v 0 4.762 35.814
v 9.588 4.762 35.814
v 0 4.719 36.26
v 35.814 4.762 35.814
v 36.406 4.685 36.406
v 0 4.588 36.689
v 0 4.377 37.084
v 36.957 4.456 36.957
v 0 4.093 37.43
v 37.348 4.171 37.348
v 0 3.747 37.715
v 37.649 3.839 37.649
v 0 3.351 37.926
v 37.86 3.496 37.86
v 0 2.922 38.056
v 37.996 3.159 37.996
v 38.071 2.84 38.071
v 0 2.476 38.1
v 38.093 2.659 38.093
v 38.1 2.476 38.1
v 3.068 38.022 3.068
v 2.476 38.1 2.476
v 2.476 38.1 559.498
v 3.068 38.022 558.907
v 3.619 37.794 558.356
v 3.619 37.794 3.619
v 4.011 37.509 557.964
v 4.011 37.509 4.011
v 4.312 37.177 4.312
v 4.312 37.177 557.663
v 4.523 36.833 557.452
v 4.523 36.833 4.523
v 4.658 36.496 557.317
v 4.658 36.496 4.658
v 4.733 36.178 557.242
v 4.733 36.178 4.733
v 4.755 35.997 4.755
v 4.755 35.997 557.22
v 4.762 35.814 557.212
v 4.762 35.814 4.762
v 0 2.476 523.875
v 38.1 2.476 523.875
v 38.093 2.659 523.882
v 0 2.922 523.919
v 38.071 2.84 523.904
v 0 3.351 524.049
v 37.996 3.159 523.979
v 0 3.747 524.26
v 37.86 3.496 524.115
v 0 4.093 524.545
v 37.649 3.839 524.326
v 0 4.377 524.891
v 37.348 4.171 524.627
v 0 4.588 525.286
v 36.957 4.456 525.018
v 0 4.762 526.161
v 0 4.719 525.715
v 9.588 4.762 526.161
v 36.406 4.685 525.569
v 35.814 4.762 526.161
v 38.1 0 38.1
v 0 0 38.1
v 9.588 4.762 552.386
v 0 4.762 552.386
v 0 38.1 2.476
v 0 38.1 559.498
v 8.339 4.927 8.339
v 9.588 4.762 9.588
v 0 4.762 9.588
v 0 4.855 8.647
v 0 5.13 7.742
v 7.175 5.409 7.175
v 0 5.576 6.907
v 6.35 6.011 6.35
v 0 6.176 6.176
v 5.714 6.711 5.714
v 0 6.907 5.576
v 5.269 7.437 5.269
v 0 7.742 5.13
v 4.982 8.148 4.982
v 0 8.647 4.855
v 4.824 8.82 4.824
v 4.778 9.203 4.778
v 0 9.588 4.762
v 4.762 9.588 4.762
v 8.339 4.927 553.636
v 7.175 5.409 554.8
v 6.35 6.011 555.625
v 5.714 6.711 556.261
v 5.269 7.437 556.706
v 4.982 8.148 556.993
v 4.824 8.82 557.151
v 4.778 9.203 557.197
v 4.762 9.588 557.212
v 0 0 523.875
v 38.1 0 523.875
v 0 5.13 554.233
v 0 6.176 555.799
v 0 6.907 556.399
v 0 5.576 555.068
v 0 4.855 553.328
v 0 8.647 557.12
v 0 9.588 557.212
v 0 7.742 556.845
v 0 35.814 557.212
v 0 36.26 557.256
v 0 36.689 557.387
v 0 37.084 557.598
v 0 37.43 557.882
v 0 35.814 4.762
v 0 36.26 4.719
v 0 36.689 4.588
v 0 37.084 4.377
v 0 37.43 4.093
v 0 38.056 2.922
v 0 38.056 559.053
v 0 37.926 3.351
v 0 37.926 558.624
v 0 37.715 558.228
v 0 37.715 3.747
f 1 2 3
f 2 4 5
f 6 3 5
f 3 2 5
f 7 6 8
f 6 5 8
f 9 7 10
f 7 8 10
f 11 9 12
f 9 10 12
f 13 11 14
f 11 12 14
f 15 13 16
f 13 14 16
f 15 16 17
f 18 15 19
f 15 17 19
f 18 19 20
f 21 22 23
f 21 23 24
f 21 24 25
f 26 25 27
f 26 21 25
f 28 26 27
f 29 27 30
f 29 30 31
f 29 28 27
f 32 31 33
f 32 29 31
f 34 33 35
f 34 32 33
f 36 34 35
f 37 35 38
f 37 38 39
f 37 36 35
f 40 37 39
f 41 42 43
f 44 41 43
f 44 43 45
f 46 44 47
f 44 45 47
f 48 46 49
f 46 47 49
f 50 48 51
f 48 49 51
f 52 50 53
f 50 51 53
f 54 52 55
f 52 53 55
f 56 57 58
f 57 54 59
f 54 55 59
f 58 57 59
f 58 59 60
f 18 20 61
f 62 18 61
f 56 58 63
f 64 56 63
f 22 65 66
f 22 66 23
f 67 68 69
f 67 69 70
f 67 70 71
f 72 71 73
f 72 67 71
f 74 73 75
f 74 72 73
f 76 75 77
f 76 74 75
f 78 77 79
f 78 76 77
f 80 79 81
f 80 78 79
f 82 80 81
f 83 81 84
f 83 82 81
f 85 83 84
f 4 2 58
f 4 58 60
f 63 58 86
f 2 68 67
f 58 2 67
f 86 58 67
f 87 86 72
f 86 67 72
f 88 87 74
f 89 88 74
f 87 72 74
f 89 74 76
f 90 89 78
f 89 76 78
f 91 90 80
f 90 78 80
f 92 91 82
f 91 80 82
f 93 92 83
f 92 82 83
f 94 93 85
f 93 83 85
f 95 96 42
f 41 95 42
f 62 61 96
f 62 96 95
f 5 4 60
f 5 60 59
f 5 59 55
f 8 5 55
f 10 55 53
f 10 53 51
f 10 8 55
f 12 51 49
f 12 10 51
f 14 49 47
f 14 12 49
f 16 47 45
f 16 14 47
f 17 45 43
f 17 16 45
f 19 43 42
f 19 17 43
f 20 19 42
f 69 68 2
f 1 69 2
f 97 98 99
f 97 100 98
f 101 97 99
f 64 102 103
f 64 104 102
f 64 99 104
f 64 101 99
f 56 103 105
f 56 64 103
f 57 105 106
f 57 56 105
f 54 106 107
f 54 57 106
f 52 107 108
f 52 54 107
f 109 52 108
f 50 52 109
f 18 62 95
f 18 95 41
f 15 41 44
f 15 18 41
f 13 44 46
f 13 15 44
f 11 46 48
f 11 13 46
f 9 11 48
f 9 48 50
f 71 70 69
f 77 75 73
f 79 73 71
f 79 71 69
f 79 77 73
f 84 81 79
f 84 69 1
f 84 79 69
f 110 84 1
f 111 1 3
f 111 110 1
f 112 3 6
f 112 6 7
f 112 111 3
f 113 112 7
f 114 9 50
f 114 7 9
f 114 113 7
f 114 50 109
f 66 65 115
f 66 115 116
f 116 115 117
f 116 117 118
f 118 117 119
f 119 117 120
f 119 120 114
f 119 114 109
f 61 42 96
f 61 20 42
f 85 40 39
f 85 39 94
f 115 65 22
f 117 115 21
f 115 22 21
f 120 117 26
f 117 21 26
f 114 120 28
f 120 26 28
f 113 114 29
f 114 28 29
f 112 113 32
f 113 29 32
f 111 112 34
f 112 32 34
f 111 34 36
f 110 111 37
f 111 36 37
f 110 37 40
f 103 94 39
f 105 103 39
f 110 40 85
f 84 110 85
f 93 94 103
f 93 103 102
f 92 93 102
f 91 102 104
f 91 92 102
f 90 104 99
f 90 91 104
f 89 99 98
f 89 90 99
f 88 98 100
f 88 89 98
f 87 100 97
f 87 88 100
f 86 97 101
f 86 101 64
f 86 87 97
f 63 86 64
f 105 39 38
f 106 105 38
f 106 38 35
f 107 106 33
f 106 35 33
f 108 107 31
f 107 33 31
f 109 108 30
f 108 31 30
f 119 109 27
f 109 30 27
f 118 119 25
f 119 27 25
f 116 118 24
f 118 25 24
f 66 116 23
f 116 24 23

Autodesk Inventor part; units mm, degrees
ref_plane "Start plane" through (0, 0, 0) normal (0, 0, 1) x (1, 0, 0)
ref_plane "End plane" through (0, 0, 561.975) normal (0, 0, 1) x (1, 0, 0)
sketch "Sketch" plane through (0, 0, 0) normal (0, 0, 1) x (1, 0, 0)
  line L0 (38.1, 0) -> (0, 0)
  line L1 (0, 0) -> (0, 38.1)
  line L2 (0, 38.1) -> (2.4765, 38.1)
  line L3 (4.7625, 35.814) -> (4.7625, 9.5885)
  line L4 (9.5885, 4.7625) -> (35.814, 4.7625)
  line L5 (38.1, 2.4765) -> (38.1, 0)
  line L6 (0, -11.0414) -> (0, 31.5385) construction
  line L7 (-11.0414, 0) -> (31.5385, 0) construction
  arc A0 (4.7625, 9.5885) -> (9.5885, 4.7625) centre (9.5885, 9.5885) ccw
  arc A1 (4.7625, 35.814) -> (2.4765, 38.1) centre (2.4765, 35.814) ccw
  arc A2 (38.1, 2.4765) -> (35.814, 4.7625) centre (35.814, 2.4765) ccw
  line L8 (0, 48.4964) -> (0, -20.9644) construction
  line L9 (-20.9644, 0) -> (48.4964, 0) construction
  point P0 (4.7625, 38.1)
  point P1 (4.7625, 4.7625)
  point P2 (38.1, 4.7625)
  dimension "d0" = 38.1
  dimension "d1" = 38.1
  dimension "d2" = 4.7625
  dimension "d3" = 4.7625
  dimension "d10" = 0
  dimension "d11" = 0
  dimension "d14" = 4.826
  dimension "d15" = 2.286
extrude "Body" add sketch "Sketch" along normal up to surface (561.975 mm away) from surface at 0
sketch "Sketch3" plane through (0, 0, 0) normal (0, 0, 1) x (1, 0, 0)
  line L0 (0, 0) -> (10, 0)
ref_plane "Work Plane3" through (0, 0, 0) normal (0, -1, 0) x (1, 0, 0)
sketch "Sketch4" plane through (0, 0, 0) normal (0, -1, 0) x (1, 0, 0)
  line L0 (-2, 0) -> (12, 0)
  line L1 (-2, 561.975) -> (12, 561.975)
  dimension "d17" = 561.975
ref_plane "Work Plane4" through (923.798, 19.05, 561.975) normal (0.7071, 0, -0.7071) x (0, 1, 0)
ref_plane "Work Plane5" through (-130.302, 19.05, 561.975) normal (-0.7071, 0, -0.7071) x (0, 1, 0)
ref_plane "Work Plane6" through (396.748, 0, 561.975) normal (-1, 0, 0) x (0, 1, 0)
sketch "Sketch5" plane through (396.748, 0, 561.975) normal (-1, 0, 0) x (0, 1, 0)
  line L0 (38.1, 0) -> (0, 0)
  line L1 (0, 0) -> (0, 38.1)
  line L2 (0, 38.1) -> (2.4765, 38.1)
  arc A0 (4.7625, 35.814) -> (2.4765, 38.1) centre (2.4765, 35.814) ccw
  line L3 (4.7625, 35.814) -> (4.7625, 9.5885)
  arc A1 (4.7625, 9.5885) -> (9.5885, 4.7625) centre (9.5885, 9.5885) ccw
  line L4 (9.5885, 4.7625) -> (35.814, 4.7625)
  arc A2 (38.1, 2.4765) -> (35.814, 4.7625) centre (35.814, 2.4765) ccw
  line L5 (38.1, 2.4765) -> (38.1, 0)
extrude "Extrusion2" cut sketch "Sketch5" along normal up to surface from surface at -527.05 surface through (-130.302, 19.05, 561.975) normal (-0.7071, 0, -0.7071)
ref_plane "Work Plane7" through (923.798, 19.05, 0) normal (0.7071, 0, 0.7071) x (0.7071, 0, -0.7071)
ref_plane "Work Plane8" through (-130.302, 19.05, 0) normal (-0.7071, 0, 0.7071) x (0.7071, 0, 0.7071)
ref_plane "Work Plane9" through (396.748, 0, 0) normal (-1, 0, 0) x (0, 0, 1)
sketch "Sketch6" plane through (396.748, 0, 0) normal (-1, 0, 0) x (0, 0, 1)
  line L0 (38.1, 0) -> (0, 0)
  line L1 (0, 0) -> (0, 38.1)
  line L2 (0, 38.1) -> (2.4765, 38.1)
  arc A0 (4.7625, 35.814) -> (2.4765, 38.1) centre (2.4765, 35.814) ccw
  line L3 (4.7625, 35.814) -> (4.7625, 9.5885)
  arc A1 (4.7625, 9.5885) -> (9.5885, 4.7625) centre (9.5885, 9.5885) ccw
  line L4 (9.5885, 4.7625) -> (35.814, 4.7625)
  arc A2 (38.1, 2.4765) -> (35.814, 4.7625) centre (35.814, 2.4765) ccw
  line L5 (38.1, 2.4765) -> (38.1, 0)
extrude "Extrusion3" cut sketch "Sketch6" along normal up to surface from surface at -527.05 surface through (-130.302, 19.05, 0) normal (-0.7071, 0, 0.7071)
equation "\"d0\" = G_H"
equation "\"d1\" = G_H"
equation "\"d2\" = G_T"
equation "\"d3\" = G_T"
equation "\"d14\" = G_IR"
equation "\"d15\" = G_ER"
equation "\"d4\" = G_L"
equation "\"G_H\" = 38.1"
equation "\"G_T\" = 4.7625"
equation "\"G_ER\" = 2.286"
equation "\"G_IR\" = 4.826"
equation "\"G_L\" = d17"
equation "\"ex\" = 0"
equation "\"G_OFFSET_START\" = 0"
equation "\"G_OFFSET_END\" = 0"
equation "\"d13\" = G_OFFSET_END + B_L"
equation "\"B_L\" = 561.975"
properties part number "AISC - L 1.5 x 1.5 x 3/16 - 22.125" material "Aluminum 6061-AHC"
